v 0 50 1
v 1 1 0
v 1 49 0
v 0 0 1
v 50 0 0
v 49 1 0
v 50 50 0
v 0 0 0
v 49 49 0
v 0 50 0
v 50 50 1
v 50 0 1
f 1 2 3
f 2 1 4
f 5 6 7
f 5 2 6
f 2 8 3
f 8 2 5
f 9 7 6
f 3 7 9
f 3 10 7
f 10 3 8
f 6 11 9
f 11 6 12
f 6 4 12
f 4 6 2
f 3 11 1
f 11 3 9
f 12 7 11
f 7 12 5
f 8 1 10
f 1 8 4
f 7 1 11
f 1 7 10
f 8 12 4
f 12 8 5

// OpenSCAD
x = 1;
y = 1;

module_size = 50;

module grid_shape() {
    polygon(
        [
            [-1,  0],
            [ 0, -1],
            [ 1,  0],
        ]
    );
}

module grid_bar_x(lenght=1) {
    rotate(a=[270, 0, 270]) {
        linear_extrude(lenght * module_size) grid_shape();
    }
}

module grid_bar_y(lenght=1) {
    rotate(a=[270, 0, 0]) {
        linear_extrude(lenght * module_size) grid_shape();
    }
}

module grid_trim(x=1, y=1) {
    size = 10;
    translate([0, 0, -1]) {
        difference() {
            translate([-size, -size, 0]) {
                cube([x * module_size + size * 2, y * module_size + size * 2, size]);
            }
            translate([0, 0, -1]) {
                cube([x * module_size, y * module_size, size + 2]);
            }
        }
    }
}

module raw_grid(x=1, y=1) {
    grid_bar_y(y);
    for (i = [1:x]) {
        translate([i * module_size, 0, 0]) {
            grid_bar_y(y);
        }
    }
    grid_bar_x(x);
    for (i = [1:y]) {
        translate([0, i * module_size, 0]) {
            grid_bar_x(x);
        }
    }
}

module grid(x=1, y=1) {
    difference() {
        raw_grid(x=x, y=y);
        grid_trim(x=x, y=y);
    }
}

grid(x=x, y=y);
